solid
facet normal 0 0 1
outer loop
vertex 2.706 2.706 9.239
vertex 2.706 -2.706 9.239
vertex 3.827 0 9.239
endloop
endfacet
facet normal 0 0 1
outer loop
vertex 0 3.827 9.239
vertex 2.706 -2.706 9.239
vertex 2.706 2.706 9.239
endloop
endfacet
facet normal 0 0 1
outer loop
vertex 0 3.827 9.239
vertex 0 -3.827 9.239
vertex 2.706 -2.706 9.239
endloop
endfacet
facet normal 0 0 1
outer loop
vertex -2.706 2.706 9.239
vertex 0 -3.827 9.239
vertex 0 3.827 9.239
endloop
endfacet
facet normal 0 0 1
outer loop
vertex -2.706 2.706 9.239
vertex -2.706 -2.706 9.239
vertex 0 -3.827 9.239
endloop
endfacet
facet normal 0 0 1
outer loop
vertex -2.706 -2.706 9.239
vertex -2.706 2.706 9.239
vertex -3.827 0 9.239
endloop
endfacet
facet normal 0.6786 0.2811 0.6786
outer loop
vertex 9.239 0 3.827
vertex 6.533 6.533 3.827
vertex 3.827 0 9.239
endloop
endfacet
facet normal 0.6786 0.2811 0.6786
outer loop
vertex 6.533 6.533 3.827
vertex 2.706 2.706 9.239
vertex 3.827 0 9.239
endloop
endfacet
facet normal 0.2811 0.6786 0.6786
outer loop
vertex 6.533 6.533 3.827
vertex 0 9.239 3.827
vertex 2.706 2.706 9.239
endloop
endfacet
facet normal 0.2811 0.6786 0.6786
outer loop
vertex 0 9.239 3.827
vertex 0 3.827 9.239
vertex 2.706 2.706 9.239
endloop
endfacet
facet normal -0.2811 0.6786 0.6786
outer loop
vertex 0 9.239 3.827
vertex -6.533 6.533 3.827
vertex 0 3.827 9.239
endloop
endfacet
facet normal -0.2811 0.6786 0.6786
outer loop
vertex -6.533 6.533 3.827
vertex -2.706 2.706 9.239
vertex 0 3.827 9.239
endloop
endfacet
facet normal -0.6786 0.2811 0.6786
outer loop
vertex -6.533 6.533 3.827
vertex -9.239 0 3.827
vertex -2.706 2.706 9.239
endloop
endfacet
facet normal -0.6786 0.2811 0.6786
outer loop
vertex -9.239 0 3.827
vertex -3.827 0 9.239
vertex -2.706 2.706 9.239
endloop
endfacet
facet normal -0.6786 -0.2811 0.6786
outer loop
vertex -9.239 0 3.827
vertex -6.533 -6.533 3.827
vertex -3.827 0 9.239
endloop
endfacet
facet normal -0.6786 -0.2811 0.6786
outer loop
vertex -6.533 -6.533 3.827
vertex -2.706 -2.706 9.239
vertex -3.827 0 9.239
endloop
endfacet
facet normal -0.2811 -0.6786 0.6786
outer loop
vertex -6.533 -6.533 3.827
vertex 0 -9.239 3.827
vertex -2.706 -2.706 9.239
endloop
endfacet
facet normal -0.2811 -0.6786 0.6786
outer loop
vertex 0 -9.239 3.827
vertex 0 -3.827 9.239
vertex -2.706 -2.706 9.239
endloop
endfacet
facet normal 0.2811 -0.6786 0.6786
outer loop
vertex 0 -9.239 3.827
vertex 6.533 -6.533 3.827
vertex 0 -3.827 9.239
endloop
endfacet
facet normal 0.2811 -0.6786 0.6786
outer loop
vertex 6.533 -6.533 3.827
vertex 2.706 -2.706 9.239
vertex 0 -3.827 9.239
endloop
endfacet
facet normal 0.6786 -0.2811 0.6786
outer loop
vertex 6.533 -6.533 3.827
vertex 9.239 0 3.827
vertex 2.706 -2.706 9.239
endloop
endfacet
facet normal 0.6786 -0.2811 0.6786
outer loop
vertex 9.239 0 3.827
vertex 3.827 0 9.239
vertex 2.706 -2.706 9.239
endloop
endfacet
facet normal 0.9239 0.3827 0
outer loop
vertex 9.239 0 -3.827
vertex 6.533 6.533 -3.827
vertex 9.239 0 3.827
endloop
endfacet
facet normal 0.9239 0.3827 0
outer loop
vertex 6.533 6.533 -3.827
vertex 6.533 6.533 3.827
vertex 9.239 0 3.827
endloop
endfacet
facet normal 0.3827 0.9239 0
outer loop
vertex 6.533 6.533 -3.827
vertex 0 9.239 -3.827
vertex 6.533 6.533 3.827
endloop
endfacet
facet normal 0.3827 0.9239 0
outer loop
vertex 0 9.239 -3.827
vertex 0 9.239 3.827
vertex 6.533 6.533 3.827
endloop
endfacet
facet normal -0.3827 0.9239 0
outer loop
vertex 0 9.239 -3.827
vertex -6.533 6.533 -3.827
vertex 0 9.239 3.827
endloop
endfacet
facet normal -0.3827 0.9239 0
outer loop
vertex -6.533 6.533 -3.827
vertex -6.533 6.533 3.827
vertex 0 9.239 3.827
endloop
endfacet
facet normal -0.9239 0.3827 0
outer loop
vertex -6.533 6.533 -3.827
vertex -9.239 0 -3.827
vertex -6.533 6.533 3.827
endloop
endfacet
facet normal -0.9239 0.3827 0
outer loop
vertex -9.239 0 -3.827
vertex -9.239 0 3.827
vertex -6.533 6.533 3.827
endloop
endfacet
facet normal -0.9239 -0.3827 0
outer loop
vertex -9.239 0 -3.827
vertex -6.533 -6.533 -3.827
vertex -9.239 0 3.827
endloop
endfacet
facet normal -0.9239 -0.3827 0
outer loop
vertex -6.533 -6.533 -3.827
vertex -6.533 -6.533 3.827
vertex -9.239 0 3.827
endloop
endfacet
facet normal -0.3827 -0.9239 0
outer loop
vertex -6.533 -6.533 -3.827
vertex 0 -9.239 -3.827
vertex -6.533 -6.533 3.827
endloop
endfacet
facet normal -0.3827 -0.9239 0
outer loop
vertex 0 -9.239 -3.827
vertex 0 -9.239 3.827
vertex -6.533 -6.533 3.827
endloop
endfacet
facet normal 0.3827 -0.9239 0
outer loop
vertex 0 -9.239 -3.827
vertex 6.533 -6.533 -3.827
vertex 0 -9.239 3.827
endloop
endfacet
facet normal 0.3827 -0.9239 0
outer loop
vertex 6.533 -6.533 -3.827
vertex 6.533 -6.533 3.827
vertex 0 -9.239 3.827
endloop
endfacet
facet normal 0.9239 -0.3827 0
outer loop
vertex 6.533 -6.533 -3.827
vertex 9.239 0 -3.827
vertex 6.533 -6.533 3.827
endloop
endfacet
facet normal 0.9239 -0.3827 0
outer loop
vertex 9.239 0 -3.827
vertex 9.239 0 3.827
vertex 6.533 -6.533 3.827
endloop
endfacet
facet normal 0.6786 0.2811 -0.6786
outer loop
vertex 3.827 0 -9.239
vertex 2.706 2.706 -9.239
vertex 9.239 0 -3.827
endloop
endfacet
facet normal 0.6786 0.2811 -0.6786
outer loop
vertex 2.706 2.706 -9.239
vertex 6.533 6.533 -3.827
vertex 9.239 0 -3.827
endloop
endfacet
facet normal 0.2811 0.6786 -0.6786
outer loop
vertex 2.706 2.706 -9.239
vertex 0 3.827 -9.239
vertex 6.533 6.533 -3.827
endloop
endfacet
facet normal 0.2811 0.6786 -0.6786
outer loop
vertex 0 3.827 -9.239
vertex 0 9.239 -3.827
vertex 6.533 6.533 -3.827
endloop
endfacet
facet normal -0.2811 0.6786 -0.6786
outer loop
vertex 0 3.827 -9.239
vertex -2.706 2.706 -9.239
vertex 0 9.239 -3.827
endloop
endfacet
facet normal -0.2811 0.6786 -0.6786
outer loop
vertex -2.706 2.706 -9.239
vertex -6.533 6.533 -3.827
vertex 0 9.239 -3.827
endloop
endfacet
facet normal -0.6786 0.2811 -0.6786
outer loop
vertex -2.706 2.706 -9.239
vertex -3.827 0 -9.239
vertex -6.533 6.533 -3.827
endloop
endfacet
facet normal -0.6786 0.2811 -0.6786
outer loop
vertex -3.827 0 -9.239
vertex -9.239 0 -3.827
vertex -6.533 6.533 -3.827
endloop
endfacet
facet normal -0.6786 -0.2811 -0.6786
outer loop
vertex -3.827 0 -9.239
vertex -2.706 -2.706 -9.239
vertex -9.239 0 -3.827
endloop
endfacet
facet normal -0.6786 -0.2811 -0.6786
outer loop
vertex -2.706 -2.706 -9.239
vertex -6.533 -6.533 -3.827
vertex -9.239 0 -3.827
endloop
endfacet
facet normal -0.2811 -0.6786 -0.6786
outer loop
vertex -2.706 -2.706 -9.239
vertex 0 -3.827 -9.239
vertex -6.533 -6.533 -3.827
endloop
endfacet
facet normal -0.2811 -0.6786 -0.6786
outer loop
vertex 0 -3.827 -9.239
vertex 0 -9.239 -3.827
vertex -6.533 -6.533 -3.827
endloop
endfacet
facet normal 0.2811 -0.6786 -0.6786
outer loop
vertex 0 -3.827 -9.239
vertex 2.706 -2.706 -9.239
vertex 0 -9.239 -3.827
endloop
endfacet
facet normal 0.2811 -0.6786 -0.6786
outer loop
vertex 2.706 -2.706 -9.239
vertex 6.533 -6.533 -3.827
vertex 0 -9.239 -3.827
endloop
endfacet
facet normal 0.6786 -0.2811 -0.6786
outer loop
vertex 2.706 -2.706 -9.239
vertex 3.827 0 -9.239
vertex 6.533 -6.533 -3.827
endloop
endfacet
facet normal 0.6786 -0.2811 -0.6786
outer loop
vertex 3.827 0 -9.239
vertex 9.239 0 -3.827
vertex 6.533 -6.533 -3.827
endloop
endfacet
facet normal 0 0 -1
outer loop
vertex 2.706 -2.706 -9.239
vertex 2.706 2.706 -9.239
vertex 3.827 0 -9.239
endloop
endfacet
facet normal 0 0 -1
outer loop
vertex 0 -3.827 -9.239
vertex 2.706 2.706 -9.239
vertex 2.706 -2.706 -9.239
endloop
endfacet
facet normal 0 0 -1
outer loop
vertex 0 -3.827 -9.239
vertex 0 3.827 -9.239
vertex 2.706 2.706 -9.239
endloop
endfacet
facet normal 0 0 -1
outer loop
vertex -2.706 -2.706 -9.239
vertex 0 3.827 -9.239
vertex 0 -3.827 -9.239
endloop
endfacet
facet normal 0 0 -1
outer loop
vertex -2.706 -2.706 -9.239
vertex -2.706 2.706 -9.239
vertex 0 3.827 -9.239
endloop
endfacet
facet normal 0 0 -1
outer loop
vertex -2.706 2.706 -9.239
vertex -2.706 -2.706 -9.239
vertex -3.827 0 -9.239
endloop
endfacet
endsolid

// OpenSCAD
// A sphere straight from the primitive has non-planar quads, which POV-Ray ignores,
// so they must be exported as triangles.
sphere(10, $fn=8);
